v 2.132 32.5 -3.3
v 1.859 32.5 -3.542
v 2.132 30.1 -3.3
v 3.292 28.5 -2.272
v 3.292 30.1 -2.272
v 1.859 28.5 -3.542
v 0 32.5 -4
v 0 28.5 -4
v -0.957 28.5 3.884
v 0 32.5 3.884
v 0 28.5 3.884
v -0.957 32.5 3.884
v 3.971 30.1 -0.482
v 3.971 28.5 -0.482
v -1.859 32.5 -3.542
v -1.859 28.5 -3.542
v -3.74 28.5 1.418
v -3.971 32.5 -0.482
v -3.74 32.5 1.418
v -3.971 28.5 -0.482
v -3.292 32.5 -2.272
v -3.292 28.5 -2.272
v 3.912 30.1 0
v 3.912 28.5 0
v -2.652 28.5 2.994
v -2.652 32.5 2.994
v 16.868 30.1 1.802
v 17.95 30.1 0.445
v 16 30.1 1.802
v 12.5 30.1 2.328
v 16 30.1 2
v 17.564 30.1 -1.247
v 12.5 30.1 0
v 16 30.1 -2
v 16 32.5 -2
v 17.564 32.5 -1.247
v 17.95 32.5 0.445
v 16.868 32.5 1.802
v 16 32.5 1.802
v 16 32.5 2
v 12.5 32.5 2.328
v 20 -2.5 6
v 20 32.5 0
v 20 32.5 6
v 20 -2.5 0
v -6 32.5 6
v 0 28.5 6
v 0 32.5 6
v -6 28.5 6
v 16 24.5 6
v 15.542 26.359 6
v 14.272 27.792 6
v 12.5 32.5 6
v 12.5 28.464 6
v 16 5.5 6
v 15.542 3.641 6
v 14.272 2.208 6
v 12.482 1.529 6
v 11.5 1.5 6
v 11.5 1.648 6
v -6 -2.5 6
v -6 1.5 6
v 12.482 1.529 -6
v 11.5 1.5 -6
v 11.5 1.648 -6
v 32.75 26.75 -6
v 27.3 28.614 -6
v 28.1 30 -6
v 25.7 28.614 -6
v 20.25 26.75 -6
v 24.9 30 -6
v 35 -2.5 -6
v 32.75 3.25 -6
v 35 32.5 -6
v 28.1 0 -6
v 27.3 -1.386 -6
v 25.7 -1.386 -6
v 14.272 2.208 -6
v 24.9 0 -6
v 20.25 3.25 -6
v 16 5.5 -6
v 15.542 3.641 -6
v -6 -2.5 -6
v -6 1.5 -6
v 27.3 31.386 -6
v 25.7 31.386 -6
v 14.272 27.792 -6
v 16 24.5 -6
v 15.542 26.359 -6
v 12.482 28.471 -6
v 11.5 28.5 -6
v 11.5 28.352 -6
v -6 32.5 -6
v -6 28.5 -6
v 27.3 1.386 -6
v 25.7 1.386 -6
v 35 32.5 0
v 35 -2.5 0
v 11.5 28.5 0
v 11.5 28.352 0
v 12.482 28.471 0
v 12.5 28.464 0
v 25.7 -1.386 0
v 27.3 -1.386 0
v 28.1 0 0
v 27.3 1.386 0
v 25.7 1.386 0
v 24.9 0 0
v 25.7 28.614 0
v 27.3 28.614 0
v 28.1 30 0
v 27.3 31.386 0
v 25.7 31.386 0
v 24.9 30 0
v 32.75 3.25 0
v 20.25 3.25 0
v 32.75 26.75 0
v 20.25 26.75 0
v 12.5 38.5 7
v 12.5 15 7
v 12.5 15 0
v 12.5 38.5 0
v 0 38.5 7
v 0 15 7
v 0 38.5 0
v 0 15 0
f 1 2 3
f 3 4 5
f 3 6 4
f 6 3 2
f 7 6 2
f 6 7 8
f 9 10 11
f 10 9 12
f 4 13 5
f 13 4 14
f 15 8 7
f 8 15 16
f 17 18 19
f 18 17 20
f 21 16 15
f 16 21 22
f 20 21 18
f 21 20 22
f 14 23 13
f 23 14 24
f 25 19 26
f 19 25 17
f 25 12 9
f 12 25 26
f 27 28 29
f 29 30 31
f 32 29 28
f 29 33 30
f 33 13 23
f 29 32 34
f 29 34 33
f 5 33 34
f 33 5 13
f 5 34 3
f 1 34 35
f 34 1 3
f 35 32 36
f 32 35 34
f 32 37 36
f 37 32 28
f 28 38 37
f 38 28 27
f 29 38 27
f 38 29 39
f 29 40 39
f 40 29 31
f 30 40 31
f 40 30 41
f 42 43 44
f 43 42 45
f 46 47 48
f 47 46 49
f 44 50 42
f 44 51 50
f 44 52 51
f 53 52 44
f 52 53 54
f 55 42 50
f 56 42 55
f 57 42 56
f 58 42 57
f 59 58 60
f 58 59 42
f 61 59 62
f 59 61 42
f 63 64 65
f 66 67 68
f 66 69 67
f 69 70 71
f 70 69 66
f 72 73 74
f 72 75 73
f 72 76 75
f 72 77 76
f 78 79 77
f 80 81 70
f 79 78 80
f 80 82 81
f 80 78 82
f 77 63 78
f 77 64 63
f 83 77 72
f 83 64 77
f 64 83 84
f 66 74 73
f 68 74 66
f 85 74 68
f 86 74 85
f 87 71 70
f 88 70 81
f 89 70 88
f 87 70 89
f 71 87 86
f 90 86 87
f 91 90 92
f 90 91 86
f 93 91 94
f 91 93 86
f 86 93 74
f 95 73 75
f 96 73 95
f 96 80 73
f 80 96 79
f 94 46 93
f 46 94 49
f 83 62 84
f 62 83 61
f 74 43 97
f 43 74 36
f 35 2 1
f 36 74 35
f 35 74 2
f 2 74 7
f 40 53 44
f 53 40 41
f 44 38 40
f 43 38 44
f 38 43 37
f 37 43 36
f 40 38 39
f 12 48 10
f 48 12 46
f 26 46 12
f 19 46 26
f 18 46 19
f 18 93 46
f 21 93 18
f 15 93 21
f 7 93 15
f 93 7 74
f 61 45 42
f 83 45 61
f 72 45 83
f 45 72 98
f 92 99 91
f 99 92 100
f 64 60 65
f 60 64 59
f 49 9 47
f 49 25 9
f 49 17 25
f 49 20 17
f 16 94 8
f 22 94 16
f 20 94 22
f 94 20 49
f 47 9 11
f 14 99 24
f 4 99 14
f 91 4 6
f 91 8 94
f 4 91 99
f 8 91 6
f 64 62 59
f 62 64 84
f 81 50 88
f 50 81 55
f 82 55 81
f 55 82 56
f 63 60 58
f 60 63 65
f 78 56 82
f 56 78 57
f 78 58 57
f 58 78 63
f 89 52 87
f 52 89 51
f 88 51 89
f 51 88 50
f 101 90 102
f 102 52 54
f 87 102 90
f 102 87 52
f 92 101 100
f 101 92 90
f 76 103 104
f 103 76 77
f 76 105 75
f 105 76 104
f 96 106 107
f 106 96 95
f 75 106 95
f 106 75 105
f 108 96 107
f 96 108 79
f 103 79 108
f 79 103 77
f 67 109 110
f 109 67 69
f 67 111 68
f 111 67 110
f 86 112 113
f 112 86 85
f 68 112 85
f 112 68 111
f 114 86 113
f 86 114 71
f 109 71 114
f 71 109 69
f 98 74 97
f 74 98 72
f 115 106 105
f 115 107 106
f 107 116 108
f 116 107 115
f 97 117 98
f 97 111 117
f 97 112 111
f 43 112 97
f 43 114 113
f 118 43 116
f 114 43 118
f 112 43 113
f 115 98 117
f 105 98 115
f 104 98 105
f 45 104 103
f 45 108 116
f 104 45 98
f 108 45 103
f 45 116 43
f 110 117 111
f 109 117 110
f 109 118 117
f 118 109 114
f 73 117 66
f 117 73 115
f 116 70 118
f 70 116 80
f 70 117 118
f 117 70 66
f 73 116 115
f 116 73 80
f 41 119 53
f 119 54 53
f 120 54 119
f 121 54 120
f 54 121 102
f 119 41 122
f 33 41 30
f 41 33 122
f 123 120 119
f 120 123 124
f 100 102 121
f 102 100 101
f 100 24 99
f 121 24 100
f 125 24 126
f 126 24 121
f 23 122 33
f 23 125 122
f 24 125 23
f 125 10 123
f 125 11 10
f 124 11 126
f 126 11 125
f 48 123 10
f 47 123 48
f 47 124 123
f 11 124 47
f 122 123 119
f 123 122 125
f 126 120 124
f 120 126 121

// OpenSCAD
// file: servo_arm.scad
module servo_arm(body_r = 8/2, arm_r1 = 7/2, arm_r2 = 4/2, arm_len = 16, arm_t = 2.5, body_t = 7) {
	cylinder(r = body_r, h = body_t);
	
	linear_extrude(height = arm_t) {
		circle(r = arm_r1);
		translate([0,arm_len,0]) circle(r = arm_r2);
		polygon(points = [ [-arm_r1, 0], [arm_r1, 0], [arm_r2, arm_len], [-arm_r2, arm_len] ]);
	}
}
// file: servo.scad
// 3dof quad
//
// servo



module servo(a = 30, b = 23, c = 27, d = 12, e = 33, f = 16, flange_thickness = 2, top_cap_pct = 0.5) {
	rem_height = c - flange_thickness - f;
	top_cap_height = rem_height * top_cap_pct;
	roundel_height = rem_height * (1.0 - top_cap_pct);	

	translate([0, -d/2, 0]) union() {
		translate([0,0,flange_thickness/2]) cube([d, e, flange_thickness], center = true);
		translate([0,0,-f/2]) cube([d, b, f], center = true);
		translate([0,0,flange_thickness + top_cap_height/2]) cube([d, b, top_cap_height], center = true);
		translate([0,b/2 - d/2,flange_thickness + top_cap_height]) union() {
			cylinder(r = d/2, h = roundel_height);
			translate([0,0,roundel_height]) cylinder(r = 3, h = 3);
		}
	}
}

//color("blue") servo();
// main file
// 3dof quad 
//
// coxa

include <servo.scad>
include <servo_arm.scad>

module coxa(servo_height = 27, servo_clearance = 7) {
	arm_thick = 4;
	servo_width = 12;
	flange_length = 3;
	base_thick = 4;
	root_radius = 4;
	block();
	fork_width = servo_width + flange_length + servo_clearance + base_thick;
	fork_height = arm_thick * 2 + servo_height;
	
	servo_cog_offset = 6;

	translate([fork_width/2 - servo_cog_offset, 0, 0]) union() {
		difference() {
			cube([fork_width, fork_height, 12], center = true);
			translate([-root_radius/2 - base_thick/2 - 1, 0, 0]) cube([1 + servo_width + flange_length + servo_clearance - root_radius, servo_height, 13], center = true);
			translate([-base_thick/2, 0, 0]) cube([servo_width + flange_length + servo_clearance, servo_height-2*root_radius, 13], center = true);
			translate([5, -9.5, 0]) cylinder(r = root_radius, h = 13, center = true);	
			translate([5, 9.5, 0]) cylinder(r = root_radius, h = 13, center = true);	
			color("white") translate([servo_cog_offset - fork_width/2, 0.1 + fork_height/2, 0]) rotate([90, 90, 0]) servo_arm();
		}

		translate([fork_width/2 + 15/2, 0, -3]) {
			difference() {	
				cube([15, fork_height, 6], center = true);
				translate([-1, 0, 0]) cube([12.5, 23.5, 7], center = true);
				for(i = [-1, 1]) {
					translate([-1, i * 30/2, 0]) cylinder(r=1.6, h=20, center = true);
				}
			}
		}
	}

}


module block()
{
cube([12.5, 23.5, 7]);
}
translate([0,15,0]) coxa(); 
//scale([-1, 1, 1]) coxa();
